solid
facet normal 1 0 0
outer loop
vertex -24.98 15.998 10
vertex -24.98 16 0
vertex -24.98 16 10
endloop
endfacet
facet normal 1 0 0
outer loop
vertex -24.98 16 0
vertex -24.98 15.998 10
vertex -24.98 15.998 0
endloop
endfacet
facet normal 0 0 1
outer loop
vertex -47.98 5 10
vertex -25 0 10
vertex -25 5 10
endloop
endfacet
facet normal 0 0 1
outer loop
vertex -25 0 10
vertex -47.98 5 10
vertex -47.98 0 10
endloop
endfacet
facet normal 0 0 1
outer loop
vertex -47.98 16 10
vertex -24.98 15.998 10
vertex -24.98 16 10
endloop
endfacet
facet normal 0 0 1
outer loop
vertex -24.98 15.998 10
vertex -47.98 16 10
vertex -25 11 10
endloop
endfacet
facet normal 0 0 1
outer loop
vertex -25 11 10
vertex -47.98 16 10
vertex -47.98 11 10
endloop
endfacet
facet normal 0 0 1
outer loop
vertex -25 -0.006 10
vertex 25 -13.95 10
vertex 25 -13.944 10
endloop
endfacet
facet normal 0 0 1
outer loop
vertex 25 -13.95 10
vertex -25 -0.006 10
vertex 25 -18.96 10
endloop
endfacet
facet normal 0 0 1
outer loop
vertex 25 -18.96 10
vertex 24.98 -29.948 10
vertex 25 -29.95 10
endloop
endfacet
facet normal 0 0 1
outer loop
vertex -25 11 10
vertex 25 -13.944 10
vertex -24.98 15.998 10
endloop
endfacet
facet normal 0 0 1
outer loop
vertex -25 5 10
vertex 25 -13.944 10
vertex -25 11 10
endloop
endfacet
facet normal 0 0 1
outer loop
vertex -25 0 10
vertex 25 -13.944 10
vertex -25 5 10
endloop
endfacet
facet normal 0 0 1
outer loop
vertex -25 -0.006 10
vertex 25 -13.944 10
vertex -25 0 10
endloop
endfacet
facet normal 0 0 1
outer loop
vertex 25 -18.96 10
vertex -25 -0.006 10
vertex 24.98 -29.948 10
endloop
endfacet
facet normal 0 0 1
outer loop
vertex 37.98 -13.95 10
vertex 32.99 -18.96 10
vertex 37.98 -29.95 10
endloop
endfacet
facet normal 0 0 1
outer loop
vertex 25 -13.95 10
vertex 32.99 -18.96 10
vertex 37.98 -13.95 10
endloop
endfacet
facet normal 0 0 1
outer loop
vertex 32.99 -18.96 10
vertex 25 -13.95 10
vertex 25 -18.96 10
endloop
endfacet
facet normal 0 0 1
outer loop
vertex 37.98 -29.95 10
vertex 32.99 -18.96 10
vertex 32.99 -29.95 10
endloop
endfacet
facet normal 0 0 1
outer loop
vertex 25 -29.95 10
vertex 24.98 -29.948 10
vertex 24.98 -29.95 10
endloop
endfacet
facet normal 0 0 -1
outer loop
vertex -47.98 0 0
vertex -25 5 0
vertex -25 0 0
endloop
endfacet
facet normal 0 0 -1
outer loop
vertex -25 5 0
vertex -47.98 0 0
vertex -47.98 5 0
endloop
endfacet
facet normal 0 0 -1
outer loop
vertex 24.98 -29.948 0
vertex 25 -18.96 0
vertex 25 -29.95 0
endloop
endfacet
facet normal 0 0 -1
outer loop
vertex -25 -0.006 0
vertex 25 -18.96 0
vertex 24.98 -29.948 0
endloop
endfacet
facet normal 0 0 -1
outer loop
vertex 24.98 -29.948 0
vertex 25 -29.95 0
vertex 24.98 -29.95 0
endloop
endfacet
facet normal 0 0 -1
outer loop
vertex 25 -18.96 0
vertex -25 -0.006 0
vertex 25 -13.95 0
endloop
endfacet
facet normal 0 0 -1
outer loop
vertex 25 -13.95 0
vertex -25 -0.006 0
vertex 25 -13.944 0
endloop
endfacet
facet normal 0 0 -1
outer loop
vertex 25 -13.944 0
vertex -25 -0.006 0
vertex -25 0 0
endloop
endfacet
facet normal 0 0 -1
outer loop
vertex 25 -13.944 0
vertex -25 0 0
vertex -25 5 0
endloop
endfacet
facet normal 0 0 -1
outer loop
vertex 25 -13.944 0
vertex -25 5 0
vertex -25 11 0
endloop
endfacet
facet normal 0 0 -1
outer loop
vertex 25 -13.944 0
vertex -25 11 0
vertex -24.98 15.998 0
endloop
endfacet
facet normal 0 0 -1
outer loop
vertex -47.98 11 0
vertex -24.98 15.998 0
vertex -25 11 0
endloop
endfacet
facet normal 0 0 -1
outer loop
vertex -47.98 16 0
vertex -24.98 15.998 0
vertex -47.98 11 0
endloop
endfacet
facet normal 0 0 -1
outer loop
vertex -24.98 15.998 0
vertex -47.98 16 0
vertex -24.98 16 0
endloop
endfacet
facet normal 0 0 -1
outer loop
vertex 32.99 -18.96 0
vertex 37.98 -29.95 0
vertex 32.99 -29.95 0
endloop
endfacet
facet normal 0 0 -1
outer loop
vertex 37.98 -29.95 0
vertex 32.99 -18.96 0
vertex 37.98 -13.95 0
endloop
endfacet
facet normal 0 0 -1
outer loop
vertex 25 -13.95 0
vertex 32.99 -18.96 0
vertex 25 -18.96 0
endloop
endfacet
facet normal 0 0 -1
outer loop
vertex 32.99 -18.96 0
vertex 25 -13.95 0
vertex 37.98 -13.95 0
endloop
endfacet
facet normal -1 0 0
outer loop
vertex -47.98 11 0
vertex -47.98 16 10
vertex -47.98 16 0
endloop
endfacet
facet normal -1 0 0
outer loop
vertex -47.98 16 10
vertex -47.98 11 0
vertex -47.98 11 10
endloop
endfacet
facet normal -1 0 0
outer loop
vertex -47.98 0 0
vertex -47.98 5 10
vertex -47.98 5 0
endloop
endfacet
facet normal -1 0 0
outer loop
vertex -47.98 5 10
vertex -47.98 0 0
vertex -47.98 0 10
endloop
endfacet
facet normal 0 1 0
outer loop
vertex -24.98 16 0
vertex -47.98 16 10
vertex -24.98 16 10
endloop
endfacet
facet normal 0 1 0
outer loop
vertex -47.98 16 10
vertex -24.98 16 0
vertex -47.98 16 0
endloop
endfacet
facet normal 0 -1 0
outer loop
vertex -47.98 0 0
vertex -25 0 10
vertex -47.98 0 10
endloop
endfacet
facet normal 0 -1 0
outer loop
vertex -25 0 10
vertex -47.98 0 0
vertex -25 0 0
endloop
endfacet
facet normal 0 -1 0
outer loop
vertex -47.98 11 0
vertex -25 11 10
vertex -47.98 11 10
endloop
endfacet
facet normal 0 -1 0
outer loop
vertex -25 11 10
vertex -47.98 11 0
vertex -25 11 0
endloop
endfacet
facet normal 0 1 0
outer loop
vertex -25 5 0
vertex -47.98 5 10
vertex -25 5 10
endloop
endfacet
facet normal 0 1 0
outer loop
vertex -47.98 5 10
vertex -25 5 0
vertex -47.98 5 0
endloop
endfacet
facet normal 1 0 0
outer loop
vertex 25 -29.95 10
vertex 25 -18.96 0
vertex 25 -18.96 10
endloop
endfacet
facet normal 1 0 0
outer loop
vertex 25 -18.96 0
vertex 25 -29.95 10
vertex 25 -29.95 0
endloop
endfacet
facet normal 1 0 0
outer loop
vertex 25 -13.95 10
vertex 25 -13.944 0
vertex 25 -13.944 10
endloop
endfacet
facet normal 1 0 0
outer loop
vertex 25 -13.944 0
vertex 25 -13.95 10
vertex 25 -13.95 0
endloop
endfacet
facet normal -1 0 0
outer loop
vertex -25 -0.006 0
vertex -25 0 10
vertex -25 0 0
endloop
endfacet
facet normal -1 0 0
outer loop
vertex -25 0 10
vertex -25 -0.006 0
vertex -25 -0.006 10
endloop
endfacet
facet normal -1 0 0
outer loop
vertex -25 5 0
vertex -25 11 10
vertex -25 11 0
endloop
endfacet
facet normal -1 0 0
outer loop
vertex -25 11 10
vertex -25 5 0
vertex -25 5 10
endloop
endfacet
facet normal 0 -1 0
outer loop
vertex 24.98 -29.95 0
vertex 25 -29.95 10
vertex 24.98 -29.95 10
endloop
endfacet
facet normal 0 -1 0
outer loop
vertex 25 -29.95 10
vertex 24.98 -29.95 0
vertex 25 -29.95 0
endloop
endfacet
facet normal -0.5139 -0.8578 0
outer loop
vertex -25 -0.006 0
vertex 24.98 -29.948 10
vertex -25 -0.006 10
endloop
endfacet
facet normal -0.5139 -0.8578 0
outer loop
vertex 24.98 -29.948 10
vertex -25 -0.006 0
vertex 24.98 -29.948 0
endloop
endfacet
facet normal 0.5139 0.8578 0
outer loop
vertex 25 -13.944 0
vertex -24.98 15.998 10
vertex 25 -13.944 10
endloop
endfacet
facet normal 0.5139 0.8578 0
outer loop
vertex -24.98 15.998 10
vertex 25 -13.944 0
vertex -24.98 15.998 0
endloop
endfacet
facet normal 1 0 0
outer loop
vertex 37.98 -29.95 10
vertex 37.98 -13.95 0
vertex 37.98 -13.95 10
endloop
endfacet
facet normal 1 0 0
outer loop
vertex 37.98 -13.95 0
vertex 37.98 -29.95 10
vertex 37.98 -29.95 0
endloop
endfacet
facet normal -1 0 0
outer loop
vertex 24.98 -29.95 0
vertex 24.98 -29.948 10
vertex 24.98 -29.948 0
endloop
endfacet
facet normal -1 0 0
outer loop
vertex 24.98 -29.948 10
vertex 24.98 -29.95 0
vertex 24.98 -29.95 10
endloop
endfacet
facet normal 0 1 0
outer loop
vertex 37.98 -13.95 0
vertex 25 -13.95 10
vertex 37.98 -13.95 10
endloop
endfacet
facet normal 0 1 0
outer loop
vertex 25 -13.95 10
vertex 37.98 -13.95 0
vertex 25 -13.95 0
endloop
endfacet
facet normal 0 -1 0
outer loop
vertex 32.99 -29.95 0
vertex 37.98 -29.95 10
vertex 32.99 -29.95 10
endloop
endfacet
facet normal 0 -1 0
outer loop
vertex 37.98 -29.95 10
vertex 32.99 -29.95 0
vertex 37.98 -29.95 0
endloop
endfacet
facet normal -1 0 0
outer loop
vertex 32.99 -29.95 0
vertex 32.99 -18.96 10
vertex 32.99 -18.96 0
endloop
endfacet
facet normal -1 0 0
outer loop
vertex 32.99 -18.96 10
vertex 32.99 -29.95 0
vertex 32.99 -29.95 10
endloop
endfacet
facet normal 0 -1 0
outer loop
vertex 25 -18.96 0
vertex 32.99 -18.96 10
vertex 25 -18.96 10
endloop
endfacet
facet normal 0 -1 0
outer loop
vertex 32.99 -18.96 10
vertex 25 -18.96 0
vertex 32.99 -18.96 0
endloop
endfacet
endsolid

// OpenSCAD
use <MCAD/triangles.scad>

// Parameters:
thickness = 10;
lenght = 50;

// Magic numbers:
a = 23;
b = 6;
c = 5;
d = 8;
//e = 0; //x axis
e = 32.95; //y axis
g = b+2*c;
f = c+e+d;

module t(){
  mirror([1, 0, 0]) rotate([0, 0, 90]) translate([-.01, -.01, -.01]) triangle(lenght+.01, f-g+.01, thickness+.02);
}

union(){
  translate([-a-lenght/2+.02, 0, 0]) difference(){
    cube([a, g, thickness]);
    translate([-.01, c, -1]) cube([a, b, thickness+2]);
  }
  translate([-lenght/2, -f+g, 0]) difference(){
    cube([lenght, f, thickness]);
    t();
    translate([lenght, f, 0]) rotate([0, 0, 180]) t();
  }
  translate([lenght/2-.02, -f+g, 0]) difference(){
    cube([d+c, g, thickness]);
    translate([.01, -.01, -1]) cube([d, d+3, thickness+2]);
  }
}
